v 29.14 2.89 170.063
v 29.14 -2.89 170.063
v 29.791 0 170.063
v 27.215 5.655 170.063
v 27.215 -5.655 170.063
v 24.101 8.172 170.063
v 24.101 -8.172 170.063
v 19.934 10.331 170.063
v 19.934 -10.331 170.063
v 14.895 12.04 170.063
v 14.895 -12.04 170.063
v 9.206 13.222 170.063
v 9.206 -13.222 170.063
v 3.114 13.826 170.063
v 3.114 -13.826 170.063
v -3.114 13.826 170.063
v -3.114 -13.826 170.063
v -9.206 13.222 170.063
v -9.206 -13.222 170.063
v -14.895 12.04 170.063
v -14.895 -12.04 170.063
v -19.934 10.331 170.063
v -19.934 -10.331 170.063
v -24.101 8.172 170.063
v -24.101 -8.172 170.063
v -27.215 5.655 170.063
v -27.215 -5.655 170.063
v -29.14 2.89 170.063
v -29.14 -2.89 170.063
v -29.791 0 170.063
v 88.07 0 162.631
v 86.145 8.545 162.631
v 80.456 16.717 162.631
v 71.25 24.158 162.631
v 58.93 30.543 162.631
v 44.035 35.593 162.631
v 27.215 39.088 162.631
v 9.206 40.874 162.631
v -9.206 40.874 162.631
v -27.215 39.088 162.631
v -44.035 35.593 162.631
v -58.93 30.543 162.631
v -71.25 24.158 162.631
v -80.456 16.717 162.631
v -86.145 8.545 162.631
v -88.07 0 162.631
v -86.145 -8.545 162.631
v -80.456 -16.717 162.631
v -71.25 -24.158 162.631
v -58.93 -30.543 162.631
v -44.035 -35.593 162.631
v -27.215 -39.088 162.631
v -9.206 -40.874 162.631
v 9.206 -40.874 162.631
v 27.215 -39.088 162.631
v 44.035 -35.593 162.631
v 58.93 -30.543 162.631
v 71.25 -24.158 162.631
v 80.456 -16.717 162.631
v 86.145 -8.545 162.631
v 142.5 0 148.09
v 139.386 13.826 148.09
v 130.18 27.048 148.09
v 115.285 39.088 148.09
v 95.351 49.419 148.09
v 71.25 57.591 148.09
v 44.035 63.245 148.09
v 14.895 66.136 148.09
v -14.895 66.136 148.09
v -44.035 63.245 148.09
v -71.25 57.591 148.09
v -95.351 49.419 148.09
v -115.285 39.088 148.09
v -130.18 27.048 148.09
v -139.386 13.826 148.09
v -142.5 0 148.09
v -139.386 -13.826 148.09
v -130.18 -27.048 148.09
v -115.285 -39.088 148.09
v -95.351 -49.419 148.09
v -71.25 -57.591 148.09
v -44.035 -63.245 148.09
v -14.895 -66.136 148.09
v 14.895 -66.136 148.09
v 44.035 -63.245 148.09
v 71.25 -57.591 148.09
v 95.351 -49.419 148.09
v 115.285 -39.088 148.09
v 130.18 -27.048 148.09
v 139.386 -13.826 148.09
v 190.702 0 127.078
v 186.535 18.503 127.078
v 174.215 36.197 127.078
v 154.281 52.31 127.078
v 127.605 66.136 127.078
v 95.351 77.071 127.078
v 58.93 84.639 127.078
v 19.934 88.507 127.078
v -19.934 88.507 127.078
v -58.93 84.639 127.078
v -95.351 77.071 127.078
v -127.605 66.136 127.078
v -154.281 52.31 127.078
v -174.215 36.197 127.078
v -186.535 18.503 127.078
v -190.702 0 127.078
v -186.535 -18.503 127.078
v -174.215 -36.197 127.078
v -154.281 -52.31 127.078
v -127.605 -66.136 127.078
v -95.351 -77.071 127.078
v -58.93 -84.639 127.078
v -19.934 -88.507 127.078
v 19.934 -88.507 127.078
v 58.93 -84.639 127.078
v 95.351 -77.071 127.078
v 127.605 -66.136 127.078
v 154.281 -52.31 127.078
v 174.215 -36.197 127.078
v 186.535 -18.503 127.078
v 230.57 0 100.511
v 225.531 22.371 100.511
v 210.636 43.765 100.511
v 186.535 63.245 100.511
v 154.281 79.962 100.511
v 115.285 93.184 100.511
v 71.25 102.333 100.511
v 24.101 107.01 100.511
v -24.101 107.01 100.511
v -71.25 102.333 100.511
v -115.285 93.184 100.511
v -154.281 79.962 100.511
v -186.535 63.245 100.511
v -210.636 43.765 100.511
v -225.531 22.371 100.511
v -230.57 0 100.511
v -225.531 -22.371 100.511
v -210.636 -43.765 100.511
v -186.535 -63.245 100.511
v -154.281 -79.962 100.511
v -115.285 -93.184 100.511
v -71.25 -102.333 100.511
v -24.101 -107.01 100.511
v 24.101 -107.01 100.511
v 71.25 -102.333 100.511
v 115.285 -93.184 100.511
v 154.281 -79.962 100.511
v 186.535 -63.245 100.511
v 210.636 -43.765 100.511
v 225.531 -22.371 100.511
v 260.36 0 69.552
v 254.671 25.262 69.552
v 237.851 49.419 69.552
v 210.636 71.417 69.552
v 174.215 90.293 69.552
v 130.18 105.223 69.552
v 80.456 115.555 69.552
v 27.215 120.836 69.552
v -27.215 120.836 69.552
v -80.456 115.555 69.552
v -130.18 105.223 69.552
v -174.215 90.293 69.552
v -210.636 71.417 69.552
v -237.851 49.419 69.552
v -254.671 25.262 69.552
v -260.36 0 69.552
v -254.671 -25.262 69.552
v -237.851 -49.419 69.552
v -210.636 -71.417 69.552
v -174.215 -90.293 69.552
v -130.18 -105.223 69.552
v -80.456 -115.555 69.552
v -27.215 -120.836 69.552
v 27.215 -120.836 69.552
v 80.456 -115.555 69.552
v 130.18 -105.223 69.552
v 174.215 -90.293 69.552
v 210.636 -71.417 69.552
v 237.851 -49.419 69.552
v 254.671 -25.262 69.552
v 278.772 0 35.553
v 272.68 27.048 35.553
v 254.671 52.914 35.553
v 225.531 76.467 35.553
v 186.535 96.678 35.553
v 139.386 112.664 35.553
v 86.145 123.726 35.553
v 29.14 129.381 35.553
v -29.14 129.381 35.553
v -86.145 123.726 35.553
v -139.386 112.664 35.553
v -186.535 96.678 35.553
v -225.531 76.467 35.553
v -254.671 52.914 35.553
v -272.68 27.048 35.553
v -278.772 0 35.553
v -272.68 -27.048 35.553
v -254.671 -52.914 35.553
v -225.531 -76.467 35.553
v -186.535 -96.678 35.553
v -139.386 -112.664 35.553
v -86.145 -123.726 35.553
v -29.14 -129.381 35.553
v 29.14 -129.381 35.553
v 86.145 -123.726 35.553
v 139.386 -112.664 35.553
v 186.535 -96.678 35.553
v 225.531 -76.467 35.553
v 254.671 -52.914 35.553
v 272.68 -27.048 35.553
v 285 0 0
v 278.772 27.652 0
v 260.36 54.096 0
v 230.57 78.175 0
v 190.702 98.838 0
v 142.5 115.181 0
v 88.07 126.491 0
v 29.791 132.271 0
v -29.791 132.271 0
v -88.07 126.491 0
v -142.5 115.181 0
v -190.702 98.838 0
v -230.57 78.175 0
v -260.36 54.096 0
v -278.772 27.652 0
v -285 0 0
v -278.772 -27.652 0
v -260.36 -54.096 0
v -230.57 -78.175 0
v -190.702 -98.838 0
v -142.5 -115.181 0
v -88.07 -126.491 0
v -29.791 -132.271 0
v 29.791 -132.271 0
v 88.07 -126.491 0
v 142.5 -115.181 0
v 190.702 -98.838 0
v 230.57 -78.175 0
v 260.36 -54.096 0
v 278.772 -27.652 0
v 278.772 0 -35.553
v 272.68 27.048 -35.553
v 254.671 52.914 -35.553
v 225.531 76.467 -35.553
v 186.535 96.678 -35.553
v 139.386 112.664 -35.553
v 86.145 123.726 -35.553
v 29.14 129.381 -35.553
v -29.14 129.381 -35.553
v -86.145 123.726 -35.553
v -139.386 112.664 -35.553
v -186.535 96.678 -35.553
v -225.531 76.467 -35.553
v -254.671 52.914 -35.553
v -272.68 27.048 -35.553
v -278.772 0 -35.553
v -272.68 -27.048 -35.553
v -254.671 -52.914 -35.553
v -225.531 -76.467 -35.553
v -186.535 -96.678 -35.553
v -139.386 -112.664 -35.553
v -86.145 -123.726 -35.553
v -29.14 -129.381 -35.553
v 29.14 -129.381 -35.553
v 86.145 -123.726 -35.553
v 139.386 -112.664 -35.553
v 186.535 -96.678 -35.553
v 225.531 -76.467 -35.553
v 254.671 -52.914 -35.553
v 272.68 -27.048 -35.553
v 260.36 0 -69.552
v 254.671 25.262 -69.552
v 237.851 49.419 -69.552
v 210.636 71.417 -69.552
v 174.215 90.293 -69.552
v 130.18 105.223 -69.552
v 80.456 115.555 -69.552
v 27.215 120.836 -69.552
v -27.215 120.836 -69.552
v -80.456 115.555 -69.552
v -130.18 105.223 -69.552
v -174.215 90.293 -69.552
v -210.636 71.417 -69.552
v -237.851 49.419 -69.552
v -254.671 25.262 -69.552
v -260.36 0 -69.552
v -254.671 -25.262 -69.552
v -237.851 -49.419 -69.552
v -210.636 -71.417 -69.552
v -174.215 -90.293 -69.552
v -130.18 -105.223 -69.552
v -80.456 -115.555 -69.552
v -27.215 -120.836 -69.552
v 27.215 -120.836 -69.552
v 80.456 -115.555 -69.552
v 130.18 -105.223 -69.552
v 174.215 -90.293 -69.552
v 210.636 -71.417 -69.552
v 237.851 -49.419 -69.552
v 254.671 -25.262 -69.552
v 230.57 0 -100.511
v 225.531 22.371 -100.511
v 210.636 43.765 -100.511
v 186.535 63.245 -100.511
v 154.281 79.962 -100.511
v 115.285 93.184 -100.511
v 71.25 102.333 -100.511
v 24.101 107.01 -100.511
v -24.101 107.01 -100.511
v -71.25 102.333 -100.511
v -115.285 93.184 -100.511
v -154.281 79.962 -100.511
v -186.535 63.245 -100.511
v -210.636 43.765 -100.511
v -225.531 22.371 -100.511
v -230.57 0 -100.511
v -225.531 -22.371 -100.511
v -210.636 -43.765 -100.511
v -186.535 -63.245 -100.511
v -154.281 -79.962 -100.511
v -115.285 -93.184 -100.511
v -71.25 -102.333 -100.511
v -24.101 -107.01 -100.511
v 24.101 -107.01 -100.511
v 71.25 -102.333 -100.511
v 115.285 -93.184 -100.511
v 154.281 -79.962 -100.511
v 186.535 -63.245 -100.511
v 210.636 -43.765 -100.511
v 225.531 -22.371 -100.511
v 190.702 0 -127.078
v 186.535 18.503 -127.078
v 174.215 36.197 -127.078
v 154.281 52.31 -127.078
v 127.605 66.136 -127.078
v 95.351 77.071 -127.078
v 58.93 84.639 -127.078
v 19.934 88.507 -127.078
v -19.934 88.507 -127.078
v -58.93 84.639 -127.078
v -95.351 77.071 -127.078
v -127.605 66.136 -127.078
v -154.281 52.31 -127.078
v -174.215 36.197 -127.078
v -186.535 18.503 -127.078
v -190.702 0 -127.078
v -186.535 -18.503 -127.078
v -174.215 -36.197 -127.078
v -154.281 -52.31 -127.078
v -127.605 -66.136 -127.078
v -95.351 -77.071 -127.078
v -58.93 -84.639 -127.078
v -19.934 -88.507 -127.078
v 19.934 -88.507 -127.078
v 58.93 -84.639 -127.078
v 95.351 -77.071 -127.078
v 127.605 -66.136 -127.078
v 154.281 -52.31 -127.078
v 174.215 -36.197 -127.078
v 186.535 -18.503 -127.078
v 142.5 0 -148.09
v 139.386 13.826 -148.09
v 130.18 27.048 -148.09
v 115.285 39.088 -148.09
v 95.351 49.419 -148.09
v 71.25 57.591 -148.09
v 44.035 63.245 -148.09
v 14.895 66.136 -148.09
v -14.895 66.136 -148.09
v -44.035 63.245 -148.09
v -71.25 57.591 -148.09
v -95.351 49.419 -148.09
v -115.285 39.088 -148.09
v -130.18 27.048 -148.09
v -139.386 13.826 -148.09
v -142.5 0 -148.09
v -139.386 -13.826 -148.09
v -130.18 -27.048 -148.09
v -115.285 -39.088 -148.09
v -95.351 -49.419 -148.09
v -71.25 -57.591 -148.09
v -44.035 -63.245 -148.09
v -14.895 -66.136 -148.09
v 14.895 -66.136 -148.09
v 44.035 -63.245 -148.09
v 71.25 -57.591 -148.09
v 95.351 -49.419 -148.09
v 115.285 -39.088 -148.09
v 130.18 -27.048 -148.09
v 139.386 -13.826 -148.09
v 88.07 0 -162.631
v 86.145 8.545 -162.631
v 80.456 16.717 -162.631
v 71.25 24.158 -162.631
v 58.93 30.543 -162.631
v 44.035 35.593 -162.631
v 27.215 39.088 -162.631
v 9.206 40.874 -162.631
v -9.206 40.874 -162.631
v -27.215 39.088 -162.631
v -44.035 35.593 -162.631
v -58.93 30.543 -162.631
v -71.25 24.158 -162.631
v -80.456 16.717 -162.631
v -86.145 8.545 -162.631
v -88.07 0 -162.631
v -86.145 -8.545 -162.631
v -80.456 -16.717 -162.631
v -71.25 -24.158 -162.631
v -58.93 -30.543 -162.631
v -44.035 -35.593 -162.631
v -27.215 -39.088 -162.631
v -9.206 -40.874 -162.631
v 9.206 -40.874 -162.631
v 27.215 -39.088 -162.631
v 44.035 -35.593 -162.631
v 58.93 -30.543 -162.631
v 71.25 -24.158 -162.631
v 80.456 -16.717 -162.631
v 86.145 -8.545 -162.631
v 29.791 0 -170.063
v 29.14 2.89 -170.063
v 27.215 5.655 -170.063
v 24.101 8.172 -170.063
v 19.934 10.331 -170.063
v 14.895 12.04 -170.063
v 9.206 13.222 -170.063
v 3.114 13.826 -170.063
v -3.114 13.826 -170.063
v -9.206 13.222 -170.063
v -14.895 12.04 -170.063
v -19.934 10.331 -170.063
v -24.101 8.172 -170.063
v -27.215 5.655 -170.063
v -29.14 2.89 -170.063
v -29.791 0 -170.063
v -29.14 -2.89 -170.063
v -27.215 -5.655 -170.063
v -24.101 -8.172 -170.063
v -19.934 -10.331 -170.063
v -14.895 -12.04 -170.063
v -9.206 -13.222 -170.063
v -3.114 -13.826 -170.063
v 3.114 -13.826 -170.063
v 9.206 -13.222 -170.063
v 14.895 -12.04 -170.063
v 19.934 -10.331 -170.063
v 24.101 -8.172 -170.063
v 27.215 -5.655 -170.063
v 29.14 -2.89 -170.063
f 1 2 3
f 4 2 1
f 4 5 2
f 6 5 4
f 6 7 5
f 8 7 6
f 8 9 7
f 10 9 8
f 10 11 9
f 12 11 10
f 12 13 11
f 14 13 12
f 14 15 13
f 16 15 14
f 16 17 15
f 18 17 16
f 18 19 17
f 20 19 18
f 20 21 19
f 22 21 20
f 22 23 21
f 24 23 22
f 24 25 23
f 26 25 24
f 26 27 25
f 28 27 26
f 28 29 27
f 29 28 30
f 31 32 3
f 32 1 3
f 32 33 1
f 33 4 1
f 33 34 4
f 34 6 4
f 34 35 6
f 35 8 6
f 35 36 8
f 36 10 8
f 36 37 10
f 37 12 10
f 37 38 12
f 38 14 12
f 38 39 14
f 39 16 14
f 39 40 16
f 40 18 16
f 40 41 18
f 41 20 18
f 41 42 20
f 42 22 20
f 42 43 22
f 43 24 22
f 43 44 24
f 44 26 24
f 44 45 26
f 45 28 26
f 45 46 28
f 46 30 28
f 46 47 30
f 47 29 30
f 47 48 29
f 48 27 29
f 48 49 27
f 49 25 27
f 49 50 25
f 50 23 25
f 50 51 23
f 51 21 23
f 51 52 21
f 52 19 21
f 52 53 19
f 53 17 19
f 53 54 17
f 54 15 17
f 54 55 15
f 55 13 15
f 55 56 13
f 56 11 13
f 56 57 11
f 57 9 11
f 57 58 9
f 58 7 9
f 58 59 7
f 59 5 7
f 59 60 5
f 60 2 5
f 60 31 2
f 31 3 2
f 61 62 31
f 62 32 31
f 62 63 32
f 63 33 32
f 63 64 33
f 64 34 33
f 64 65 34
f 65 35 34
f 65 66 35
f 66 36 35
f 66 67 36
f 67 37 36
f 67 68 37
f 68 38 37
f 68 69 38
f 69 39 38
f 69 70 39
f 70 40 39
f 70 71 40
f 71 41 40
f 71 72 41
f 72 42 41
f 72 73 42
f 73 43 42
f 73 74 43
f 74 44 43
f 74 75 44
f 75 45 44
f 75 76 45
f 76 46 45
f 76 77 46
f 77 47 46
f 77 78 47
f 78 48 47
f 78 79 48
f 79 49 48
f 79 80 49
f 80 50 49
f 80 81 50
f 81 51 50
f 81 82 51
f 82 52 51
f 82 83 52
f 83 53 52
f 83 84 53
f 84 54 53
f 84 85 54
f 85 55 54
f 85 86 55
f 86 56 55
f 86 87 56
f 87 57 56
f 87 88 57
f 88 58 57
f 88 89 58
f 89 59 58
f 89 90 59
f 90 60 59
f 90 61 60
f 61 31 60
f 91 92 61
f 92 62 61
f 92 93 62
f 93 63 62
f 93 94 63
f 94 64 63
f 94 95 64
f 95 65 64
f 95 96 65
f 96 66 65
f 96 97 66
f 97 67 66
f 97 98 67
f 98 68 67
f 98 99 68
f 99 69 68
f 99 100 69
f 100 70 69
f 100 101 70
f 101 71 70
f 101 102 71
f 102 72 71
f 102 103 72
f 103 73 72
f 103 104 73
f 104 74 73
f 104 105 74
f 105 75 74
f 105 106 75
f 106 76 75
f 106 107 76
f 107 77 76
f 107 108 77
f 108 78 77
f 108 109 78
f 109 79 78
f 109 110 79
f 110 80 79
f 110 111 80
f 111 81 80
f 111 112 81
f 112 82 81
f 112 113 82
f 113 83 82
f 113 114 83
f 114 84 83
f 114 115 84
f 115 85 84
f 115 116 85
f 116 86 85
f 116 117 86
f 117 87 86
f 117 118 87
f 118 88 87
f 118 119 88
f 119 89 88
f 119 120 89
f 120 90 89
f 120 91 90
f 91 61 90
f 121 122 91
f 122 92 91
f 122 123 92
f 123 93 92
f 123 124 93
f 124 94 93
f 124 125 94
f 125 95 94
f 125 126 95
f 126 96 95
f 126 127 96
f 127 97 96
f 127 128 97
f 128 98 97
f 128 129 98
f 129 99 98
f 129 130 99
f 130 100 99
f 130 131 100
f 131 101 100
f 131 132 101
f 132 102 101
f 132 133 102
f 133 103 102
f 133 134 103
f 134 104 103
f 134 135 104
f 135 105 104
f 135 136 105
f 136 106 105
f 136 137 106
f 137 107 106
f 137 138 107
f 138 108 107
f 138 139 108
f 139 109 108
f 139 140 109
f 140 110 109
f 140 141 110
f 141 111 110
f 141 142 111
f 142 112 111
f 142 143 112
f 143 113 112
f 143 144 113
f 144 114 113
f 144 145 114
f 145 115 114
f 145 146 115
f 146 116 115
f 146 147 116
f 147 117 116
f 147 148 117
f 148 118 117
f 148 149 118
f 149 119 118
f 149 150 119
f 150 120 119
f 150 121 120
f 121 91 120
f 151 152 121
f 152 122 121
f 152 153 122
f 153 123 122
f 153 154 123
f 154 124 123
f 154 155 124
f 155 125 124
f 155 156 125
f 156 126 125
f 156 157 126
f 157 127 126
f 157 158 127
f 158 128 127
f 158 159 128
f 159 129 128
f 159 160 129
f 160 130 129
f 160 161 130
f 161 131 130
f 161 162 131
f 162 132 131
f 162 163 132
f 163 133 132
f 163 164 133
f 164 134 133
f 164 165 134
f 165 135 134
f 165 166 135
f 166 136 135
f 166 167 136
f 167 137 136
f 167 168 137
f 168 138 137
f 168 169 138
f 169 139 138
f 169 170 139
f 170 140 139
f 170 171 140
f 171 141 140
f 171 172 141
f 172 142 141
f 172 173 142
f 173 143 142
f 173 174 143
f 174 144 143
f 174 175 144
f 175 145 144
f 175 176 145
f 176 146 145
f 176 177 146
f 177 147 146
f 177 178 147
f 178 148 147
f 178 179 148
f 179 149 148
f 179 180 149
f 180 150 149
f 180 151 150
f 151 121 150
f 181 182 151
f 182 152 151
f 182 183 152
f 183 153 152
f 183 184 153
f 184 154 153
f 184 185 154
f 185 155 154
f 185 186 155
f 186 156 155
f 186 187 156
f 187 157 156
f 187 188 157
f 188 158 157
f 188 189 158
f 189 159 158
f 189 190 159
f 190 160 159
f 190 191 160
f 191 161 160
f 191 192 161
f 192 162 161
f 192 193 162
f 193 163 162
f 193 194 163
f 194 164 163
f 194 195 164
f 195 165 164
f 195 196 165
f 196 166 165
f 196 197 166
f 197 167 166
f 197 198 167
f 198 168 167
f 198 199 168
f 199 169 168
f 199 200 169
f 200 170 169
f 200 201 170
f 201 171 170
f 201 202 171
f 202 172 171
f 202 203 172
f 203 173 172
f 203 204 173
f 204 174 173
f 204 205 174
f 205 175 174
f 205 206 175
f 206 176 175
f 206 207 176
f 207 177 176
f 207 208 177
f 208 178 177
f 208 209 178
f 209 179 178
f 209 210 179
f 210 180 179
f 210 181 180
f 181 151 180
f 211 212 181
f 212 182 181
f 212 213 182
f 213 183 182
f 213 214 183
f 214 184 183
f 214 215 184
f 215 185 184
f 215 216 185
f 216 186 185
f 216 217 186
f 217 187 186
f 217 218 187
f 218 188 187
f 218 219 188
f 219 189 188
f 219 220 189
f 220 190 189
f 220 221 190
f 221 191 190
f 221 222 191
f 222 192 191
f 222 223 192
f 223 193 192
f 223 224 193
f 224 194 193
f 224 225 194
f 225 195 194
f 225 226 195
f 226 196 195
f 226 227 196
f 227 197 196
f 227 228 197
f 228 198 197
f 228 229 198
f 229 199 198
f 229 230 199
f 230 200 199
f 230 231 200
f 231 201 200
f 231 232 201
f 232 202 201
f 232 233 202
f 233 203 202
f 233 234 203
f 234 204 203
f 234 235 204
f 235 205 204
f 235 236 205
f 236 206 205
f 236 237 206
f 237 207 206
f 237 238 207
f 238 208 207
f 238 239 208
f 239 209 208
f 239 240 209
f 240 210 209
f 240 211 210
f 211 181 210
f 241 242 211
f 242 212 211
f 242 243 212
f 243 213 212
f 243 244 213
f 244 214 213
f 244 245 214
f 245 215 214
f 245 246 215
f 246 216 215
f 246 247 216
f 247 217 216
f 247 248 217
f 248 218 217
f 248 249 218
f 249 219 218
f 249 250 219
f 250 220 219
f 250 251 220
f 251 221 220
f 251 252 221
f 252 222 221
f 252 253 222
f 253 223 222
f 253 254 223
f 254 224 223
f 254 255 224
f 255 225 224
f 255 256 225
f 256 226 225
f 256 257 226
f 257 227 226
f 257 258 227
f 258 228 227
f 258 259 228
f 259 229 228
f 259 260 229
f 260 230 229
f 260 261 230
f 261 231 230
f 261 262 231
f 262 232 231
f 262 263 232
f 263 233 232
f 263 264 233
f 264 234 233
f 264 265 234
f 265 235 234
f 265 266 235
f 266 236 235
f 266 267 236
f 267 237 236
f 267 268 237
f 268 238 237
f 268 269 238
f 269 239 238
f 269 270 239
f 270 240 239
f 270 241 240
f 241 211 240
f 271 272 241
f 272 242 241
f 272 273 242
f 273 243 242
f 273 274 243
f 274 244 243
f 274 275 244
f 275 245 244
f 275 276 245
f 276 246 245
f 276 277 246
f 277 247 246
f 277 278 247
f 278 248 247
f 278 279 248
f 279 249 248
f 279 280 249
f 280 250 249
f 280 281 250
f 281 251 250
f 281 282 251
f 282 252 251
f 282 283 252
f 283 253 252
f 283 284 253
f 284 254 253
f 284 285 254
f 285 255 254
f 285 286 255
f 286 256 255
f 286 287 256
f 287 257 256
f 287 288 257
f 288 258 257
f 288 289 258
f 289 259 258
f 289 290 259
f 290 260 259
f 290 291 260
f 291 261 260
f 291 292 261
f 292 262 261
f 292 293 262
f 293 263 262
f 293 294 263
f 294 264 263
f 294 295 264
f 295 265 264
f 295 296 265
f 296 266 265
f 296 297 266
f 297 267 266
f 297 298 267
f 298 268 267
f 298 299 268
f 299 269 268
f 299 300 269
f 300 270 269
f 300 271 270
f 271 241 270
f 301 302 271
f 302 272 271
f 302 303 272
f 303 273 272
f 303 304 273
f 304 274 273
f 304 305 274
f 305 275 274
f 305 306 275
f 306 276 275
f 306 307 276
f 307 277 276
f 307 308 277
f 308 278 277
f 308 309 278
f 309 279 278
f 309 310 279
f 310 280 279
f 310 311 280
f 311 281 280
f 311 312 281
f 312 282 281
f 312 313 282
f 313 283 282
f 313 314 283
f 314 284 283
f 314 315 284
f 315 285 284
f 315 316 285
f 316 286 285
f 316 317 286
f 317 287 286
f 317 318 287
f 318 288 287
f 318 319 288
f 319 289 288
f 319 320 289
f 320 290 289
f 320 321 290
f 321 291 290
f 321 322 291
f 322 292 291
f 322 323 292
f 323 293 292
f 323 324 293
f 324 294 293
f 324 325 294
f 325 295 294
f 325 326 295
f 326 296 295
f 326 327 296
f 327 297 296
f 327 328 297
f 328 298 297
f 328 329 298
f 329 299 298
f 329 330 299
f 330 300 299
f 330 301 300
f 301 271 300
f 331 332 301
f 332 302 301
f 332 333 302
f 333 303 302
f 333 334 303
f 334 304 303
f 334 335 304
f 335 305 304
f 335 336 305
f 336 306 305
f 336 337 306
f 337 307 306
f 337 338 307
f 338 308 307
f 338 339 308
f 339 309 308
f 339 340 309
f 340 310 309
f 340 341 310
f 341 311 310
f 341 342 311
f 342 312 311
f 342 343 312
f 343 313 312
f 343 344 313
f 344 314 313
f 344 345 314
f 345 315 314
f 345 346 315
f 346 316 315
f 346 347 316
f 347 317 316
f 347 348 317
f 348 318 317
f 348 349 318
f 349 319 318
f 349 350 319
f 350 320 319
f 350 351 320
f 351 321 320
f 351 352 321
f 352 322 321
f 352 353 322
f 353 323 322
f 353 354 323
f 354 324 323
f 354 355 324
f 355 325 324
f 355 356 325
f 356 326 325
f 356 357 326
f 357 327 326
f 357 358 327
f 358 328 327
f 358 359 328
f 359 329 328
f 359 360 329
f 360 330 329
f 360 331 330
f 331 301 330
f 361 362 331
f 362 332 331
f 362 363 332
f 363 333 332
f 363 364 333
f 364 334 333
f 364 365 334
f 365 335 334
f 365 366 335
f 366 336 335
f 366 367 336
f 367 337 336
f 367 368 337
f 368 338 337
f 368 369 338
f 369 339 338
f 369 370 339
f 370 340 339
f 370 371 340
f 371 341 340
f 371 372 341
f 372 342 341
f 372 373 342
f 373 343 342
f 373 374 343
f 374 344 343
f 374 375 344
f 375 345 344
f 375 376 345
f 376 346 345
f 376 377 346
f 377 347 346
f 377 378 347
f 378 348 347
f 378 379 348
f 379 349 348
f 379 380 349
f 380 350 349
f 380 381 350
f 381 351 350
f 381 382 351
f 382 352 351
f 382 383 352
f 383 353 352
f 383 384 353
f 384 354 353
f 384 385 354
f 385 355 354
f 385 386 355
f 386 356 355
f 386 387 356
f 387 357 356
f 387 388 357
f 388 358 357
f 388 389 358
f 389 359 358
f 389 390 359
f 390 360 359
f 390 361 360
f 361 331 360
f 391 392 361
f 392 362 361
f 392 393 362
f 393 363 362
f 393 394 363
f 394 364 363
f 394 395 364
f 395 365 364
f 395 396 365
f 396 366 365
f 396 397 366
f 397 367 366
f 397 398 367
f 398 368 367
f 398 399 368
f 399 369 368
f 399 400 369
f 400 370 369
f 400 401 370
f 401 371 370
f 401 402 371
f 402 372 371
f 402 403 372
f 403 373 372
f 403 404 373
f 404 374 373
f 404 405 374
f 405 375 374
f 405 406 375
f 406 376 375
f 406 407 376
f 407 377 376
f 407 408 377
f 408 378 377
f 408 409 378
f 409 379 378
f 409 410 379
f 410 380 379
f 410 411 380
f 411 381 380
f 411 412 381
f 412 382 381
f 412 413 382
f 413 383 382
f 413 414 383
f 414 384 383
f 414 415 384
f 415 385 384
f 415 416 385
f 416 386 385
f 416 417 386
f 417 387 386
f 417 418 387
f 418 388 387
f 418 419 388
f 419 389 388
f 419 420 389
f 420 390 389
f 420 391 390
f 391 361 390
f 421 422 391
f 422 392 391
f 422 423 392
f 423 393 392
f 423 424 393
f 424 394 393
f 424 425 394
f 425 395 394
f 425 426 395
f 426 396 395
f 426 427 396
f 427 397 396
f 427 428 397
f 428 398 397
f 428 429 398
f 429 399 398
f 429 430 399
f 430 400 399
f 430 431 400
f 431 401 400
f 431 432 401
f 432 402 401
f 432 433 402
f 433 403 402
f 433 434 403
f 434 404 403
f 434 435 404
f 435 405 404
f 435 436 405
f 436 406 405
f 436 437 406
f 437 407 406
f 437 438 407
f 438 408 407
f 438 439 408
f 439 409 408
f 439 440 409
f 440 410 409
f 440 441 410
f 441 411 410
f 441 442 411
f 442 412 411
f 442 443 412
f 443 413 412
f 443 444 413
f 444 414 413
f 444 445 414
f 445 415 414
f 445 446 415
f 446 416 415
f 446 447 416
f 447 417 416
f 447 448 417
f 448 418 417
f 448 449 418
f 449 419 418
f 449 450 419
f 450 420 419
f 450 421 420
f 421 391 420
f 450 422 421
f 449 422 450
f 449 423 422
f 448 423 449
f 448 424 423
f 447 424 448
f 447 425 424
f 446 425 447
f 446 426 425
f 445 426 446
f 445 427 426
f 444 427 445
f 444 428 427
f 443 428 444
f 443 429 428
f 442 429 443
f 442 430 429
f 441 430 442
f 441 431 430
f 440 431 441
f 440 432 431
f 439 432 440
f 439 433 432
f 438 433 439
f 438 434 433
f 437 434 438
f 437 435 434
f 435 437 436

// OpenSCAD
// Generated by SolidPython 1.0.1 on 2020-07-29 00:46:51


scale(v = [15, 7, 9]) {
	sphere(r = 19);
}
/***********************************************
*********      SolidPython code:      **********
************************************************
 
# import packages: SolidPython
from solid import *
from solid.utils import *
from itertools import chain, combinations, permutations


class Resize:

    def __init__(self, scad_file):
        self.scad_file = scad_file
        #self.scad_file = import_scad(scad_file)
        # cone/cylinder param:
        self.r1 = 0
        self.r2 = 0
        self.h = 0
        # rectangular prism param:
        self.w = 0
        self.l = 0
        # ellipse param:
        self.r = 0

    # import OpenScad code (file name corresponds to shape)


    # classify shape + parameters
    def assign(self, param1, param2, param3):
        if self.scad_file == 'cone.scad':
            self.r1 = param1
            self.r2 = param2
            self.h = param3
        elif self.scad_file == 'cylinder.scad':
            self.r1 = param1
            self.r2 = param2
            self.h = param3
        elif self.scad_file == 'rectangularPrism.scad':
            self.h = param1
            self.l = param2
            self.w = param3
        else:
            self.r = param1
            self.h = param2

    # resize parameters
    def iterate(self):
        x = range(3, 20, 2)
        i = 1
        if self.scad_file == 'cone.scad':
            tempList = list(permutations(x, 2))
            for temp in tempList:
                param1 = temp[0]
                param2 = temp[1]
                filepath = 'produced_scad_files/' + 'cone' + str(param1) + '_' + str(param2) + '_' + '.scad'
                scad_render_to_file(cylinder(h=param1, r1=param2, r2=0), filepath)

        elif self.scad_file == 'cylinder.scad':
            tempList = list(permutations(x, 3))
            for temp in tempList:
                param1 = temp[0]
                param2 = temp[1]
                filepath = 'produced_scad_files/' + 'cylinder' + str(param1) + '_' + str(param2) + '_' + '.scad'
                scad_render_to_file(cylinder(h=param1, r1=param2, r2=param2), filepath)

        elif self.scad_file == 'rectangularPrism.scad':
            tempList = list(permutations(x, 3))
            for temp in tempList:
                param1 = temp[0]
                param2 = temp[1]
                param3 = temp[2]
                filepath = 'produced_scad_files/' + 'rectangularPrism' + str(param1) + '_' + str(param2) + '_' + str(
                    param3) + '.scad'
                scad_render_to_file(cube(size=(param1, param2, param3)), filepath)

        elif self.scad_file == 'ellipse.scad':
            tempList = list(permutations(x, 4))
            for temp in tempList:
                param1 = temp[0]
                param2 = temp[1]
                param3 = temp[2]
                param4 = temp[3]
                filepath = 'produced_scad_files/' + 'ellipse' + str(param1) + '_' + str(param2) + '_' + str(param3) + '_' + str(param4) + '.scad'
                scad_render_to_file(scale([param1, param2, param3])(sphere(r=param4)), filepath)

    def render_to_scadfile(self):
        scad_render_to_file(scad, 'example.scad') 
 
************************************************/
